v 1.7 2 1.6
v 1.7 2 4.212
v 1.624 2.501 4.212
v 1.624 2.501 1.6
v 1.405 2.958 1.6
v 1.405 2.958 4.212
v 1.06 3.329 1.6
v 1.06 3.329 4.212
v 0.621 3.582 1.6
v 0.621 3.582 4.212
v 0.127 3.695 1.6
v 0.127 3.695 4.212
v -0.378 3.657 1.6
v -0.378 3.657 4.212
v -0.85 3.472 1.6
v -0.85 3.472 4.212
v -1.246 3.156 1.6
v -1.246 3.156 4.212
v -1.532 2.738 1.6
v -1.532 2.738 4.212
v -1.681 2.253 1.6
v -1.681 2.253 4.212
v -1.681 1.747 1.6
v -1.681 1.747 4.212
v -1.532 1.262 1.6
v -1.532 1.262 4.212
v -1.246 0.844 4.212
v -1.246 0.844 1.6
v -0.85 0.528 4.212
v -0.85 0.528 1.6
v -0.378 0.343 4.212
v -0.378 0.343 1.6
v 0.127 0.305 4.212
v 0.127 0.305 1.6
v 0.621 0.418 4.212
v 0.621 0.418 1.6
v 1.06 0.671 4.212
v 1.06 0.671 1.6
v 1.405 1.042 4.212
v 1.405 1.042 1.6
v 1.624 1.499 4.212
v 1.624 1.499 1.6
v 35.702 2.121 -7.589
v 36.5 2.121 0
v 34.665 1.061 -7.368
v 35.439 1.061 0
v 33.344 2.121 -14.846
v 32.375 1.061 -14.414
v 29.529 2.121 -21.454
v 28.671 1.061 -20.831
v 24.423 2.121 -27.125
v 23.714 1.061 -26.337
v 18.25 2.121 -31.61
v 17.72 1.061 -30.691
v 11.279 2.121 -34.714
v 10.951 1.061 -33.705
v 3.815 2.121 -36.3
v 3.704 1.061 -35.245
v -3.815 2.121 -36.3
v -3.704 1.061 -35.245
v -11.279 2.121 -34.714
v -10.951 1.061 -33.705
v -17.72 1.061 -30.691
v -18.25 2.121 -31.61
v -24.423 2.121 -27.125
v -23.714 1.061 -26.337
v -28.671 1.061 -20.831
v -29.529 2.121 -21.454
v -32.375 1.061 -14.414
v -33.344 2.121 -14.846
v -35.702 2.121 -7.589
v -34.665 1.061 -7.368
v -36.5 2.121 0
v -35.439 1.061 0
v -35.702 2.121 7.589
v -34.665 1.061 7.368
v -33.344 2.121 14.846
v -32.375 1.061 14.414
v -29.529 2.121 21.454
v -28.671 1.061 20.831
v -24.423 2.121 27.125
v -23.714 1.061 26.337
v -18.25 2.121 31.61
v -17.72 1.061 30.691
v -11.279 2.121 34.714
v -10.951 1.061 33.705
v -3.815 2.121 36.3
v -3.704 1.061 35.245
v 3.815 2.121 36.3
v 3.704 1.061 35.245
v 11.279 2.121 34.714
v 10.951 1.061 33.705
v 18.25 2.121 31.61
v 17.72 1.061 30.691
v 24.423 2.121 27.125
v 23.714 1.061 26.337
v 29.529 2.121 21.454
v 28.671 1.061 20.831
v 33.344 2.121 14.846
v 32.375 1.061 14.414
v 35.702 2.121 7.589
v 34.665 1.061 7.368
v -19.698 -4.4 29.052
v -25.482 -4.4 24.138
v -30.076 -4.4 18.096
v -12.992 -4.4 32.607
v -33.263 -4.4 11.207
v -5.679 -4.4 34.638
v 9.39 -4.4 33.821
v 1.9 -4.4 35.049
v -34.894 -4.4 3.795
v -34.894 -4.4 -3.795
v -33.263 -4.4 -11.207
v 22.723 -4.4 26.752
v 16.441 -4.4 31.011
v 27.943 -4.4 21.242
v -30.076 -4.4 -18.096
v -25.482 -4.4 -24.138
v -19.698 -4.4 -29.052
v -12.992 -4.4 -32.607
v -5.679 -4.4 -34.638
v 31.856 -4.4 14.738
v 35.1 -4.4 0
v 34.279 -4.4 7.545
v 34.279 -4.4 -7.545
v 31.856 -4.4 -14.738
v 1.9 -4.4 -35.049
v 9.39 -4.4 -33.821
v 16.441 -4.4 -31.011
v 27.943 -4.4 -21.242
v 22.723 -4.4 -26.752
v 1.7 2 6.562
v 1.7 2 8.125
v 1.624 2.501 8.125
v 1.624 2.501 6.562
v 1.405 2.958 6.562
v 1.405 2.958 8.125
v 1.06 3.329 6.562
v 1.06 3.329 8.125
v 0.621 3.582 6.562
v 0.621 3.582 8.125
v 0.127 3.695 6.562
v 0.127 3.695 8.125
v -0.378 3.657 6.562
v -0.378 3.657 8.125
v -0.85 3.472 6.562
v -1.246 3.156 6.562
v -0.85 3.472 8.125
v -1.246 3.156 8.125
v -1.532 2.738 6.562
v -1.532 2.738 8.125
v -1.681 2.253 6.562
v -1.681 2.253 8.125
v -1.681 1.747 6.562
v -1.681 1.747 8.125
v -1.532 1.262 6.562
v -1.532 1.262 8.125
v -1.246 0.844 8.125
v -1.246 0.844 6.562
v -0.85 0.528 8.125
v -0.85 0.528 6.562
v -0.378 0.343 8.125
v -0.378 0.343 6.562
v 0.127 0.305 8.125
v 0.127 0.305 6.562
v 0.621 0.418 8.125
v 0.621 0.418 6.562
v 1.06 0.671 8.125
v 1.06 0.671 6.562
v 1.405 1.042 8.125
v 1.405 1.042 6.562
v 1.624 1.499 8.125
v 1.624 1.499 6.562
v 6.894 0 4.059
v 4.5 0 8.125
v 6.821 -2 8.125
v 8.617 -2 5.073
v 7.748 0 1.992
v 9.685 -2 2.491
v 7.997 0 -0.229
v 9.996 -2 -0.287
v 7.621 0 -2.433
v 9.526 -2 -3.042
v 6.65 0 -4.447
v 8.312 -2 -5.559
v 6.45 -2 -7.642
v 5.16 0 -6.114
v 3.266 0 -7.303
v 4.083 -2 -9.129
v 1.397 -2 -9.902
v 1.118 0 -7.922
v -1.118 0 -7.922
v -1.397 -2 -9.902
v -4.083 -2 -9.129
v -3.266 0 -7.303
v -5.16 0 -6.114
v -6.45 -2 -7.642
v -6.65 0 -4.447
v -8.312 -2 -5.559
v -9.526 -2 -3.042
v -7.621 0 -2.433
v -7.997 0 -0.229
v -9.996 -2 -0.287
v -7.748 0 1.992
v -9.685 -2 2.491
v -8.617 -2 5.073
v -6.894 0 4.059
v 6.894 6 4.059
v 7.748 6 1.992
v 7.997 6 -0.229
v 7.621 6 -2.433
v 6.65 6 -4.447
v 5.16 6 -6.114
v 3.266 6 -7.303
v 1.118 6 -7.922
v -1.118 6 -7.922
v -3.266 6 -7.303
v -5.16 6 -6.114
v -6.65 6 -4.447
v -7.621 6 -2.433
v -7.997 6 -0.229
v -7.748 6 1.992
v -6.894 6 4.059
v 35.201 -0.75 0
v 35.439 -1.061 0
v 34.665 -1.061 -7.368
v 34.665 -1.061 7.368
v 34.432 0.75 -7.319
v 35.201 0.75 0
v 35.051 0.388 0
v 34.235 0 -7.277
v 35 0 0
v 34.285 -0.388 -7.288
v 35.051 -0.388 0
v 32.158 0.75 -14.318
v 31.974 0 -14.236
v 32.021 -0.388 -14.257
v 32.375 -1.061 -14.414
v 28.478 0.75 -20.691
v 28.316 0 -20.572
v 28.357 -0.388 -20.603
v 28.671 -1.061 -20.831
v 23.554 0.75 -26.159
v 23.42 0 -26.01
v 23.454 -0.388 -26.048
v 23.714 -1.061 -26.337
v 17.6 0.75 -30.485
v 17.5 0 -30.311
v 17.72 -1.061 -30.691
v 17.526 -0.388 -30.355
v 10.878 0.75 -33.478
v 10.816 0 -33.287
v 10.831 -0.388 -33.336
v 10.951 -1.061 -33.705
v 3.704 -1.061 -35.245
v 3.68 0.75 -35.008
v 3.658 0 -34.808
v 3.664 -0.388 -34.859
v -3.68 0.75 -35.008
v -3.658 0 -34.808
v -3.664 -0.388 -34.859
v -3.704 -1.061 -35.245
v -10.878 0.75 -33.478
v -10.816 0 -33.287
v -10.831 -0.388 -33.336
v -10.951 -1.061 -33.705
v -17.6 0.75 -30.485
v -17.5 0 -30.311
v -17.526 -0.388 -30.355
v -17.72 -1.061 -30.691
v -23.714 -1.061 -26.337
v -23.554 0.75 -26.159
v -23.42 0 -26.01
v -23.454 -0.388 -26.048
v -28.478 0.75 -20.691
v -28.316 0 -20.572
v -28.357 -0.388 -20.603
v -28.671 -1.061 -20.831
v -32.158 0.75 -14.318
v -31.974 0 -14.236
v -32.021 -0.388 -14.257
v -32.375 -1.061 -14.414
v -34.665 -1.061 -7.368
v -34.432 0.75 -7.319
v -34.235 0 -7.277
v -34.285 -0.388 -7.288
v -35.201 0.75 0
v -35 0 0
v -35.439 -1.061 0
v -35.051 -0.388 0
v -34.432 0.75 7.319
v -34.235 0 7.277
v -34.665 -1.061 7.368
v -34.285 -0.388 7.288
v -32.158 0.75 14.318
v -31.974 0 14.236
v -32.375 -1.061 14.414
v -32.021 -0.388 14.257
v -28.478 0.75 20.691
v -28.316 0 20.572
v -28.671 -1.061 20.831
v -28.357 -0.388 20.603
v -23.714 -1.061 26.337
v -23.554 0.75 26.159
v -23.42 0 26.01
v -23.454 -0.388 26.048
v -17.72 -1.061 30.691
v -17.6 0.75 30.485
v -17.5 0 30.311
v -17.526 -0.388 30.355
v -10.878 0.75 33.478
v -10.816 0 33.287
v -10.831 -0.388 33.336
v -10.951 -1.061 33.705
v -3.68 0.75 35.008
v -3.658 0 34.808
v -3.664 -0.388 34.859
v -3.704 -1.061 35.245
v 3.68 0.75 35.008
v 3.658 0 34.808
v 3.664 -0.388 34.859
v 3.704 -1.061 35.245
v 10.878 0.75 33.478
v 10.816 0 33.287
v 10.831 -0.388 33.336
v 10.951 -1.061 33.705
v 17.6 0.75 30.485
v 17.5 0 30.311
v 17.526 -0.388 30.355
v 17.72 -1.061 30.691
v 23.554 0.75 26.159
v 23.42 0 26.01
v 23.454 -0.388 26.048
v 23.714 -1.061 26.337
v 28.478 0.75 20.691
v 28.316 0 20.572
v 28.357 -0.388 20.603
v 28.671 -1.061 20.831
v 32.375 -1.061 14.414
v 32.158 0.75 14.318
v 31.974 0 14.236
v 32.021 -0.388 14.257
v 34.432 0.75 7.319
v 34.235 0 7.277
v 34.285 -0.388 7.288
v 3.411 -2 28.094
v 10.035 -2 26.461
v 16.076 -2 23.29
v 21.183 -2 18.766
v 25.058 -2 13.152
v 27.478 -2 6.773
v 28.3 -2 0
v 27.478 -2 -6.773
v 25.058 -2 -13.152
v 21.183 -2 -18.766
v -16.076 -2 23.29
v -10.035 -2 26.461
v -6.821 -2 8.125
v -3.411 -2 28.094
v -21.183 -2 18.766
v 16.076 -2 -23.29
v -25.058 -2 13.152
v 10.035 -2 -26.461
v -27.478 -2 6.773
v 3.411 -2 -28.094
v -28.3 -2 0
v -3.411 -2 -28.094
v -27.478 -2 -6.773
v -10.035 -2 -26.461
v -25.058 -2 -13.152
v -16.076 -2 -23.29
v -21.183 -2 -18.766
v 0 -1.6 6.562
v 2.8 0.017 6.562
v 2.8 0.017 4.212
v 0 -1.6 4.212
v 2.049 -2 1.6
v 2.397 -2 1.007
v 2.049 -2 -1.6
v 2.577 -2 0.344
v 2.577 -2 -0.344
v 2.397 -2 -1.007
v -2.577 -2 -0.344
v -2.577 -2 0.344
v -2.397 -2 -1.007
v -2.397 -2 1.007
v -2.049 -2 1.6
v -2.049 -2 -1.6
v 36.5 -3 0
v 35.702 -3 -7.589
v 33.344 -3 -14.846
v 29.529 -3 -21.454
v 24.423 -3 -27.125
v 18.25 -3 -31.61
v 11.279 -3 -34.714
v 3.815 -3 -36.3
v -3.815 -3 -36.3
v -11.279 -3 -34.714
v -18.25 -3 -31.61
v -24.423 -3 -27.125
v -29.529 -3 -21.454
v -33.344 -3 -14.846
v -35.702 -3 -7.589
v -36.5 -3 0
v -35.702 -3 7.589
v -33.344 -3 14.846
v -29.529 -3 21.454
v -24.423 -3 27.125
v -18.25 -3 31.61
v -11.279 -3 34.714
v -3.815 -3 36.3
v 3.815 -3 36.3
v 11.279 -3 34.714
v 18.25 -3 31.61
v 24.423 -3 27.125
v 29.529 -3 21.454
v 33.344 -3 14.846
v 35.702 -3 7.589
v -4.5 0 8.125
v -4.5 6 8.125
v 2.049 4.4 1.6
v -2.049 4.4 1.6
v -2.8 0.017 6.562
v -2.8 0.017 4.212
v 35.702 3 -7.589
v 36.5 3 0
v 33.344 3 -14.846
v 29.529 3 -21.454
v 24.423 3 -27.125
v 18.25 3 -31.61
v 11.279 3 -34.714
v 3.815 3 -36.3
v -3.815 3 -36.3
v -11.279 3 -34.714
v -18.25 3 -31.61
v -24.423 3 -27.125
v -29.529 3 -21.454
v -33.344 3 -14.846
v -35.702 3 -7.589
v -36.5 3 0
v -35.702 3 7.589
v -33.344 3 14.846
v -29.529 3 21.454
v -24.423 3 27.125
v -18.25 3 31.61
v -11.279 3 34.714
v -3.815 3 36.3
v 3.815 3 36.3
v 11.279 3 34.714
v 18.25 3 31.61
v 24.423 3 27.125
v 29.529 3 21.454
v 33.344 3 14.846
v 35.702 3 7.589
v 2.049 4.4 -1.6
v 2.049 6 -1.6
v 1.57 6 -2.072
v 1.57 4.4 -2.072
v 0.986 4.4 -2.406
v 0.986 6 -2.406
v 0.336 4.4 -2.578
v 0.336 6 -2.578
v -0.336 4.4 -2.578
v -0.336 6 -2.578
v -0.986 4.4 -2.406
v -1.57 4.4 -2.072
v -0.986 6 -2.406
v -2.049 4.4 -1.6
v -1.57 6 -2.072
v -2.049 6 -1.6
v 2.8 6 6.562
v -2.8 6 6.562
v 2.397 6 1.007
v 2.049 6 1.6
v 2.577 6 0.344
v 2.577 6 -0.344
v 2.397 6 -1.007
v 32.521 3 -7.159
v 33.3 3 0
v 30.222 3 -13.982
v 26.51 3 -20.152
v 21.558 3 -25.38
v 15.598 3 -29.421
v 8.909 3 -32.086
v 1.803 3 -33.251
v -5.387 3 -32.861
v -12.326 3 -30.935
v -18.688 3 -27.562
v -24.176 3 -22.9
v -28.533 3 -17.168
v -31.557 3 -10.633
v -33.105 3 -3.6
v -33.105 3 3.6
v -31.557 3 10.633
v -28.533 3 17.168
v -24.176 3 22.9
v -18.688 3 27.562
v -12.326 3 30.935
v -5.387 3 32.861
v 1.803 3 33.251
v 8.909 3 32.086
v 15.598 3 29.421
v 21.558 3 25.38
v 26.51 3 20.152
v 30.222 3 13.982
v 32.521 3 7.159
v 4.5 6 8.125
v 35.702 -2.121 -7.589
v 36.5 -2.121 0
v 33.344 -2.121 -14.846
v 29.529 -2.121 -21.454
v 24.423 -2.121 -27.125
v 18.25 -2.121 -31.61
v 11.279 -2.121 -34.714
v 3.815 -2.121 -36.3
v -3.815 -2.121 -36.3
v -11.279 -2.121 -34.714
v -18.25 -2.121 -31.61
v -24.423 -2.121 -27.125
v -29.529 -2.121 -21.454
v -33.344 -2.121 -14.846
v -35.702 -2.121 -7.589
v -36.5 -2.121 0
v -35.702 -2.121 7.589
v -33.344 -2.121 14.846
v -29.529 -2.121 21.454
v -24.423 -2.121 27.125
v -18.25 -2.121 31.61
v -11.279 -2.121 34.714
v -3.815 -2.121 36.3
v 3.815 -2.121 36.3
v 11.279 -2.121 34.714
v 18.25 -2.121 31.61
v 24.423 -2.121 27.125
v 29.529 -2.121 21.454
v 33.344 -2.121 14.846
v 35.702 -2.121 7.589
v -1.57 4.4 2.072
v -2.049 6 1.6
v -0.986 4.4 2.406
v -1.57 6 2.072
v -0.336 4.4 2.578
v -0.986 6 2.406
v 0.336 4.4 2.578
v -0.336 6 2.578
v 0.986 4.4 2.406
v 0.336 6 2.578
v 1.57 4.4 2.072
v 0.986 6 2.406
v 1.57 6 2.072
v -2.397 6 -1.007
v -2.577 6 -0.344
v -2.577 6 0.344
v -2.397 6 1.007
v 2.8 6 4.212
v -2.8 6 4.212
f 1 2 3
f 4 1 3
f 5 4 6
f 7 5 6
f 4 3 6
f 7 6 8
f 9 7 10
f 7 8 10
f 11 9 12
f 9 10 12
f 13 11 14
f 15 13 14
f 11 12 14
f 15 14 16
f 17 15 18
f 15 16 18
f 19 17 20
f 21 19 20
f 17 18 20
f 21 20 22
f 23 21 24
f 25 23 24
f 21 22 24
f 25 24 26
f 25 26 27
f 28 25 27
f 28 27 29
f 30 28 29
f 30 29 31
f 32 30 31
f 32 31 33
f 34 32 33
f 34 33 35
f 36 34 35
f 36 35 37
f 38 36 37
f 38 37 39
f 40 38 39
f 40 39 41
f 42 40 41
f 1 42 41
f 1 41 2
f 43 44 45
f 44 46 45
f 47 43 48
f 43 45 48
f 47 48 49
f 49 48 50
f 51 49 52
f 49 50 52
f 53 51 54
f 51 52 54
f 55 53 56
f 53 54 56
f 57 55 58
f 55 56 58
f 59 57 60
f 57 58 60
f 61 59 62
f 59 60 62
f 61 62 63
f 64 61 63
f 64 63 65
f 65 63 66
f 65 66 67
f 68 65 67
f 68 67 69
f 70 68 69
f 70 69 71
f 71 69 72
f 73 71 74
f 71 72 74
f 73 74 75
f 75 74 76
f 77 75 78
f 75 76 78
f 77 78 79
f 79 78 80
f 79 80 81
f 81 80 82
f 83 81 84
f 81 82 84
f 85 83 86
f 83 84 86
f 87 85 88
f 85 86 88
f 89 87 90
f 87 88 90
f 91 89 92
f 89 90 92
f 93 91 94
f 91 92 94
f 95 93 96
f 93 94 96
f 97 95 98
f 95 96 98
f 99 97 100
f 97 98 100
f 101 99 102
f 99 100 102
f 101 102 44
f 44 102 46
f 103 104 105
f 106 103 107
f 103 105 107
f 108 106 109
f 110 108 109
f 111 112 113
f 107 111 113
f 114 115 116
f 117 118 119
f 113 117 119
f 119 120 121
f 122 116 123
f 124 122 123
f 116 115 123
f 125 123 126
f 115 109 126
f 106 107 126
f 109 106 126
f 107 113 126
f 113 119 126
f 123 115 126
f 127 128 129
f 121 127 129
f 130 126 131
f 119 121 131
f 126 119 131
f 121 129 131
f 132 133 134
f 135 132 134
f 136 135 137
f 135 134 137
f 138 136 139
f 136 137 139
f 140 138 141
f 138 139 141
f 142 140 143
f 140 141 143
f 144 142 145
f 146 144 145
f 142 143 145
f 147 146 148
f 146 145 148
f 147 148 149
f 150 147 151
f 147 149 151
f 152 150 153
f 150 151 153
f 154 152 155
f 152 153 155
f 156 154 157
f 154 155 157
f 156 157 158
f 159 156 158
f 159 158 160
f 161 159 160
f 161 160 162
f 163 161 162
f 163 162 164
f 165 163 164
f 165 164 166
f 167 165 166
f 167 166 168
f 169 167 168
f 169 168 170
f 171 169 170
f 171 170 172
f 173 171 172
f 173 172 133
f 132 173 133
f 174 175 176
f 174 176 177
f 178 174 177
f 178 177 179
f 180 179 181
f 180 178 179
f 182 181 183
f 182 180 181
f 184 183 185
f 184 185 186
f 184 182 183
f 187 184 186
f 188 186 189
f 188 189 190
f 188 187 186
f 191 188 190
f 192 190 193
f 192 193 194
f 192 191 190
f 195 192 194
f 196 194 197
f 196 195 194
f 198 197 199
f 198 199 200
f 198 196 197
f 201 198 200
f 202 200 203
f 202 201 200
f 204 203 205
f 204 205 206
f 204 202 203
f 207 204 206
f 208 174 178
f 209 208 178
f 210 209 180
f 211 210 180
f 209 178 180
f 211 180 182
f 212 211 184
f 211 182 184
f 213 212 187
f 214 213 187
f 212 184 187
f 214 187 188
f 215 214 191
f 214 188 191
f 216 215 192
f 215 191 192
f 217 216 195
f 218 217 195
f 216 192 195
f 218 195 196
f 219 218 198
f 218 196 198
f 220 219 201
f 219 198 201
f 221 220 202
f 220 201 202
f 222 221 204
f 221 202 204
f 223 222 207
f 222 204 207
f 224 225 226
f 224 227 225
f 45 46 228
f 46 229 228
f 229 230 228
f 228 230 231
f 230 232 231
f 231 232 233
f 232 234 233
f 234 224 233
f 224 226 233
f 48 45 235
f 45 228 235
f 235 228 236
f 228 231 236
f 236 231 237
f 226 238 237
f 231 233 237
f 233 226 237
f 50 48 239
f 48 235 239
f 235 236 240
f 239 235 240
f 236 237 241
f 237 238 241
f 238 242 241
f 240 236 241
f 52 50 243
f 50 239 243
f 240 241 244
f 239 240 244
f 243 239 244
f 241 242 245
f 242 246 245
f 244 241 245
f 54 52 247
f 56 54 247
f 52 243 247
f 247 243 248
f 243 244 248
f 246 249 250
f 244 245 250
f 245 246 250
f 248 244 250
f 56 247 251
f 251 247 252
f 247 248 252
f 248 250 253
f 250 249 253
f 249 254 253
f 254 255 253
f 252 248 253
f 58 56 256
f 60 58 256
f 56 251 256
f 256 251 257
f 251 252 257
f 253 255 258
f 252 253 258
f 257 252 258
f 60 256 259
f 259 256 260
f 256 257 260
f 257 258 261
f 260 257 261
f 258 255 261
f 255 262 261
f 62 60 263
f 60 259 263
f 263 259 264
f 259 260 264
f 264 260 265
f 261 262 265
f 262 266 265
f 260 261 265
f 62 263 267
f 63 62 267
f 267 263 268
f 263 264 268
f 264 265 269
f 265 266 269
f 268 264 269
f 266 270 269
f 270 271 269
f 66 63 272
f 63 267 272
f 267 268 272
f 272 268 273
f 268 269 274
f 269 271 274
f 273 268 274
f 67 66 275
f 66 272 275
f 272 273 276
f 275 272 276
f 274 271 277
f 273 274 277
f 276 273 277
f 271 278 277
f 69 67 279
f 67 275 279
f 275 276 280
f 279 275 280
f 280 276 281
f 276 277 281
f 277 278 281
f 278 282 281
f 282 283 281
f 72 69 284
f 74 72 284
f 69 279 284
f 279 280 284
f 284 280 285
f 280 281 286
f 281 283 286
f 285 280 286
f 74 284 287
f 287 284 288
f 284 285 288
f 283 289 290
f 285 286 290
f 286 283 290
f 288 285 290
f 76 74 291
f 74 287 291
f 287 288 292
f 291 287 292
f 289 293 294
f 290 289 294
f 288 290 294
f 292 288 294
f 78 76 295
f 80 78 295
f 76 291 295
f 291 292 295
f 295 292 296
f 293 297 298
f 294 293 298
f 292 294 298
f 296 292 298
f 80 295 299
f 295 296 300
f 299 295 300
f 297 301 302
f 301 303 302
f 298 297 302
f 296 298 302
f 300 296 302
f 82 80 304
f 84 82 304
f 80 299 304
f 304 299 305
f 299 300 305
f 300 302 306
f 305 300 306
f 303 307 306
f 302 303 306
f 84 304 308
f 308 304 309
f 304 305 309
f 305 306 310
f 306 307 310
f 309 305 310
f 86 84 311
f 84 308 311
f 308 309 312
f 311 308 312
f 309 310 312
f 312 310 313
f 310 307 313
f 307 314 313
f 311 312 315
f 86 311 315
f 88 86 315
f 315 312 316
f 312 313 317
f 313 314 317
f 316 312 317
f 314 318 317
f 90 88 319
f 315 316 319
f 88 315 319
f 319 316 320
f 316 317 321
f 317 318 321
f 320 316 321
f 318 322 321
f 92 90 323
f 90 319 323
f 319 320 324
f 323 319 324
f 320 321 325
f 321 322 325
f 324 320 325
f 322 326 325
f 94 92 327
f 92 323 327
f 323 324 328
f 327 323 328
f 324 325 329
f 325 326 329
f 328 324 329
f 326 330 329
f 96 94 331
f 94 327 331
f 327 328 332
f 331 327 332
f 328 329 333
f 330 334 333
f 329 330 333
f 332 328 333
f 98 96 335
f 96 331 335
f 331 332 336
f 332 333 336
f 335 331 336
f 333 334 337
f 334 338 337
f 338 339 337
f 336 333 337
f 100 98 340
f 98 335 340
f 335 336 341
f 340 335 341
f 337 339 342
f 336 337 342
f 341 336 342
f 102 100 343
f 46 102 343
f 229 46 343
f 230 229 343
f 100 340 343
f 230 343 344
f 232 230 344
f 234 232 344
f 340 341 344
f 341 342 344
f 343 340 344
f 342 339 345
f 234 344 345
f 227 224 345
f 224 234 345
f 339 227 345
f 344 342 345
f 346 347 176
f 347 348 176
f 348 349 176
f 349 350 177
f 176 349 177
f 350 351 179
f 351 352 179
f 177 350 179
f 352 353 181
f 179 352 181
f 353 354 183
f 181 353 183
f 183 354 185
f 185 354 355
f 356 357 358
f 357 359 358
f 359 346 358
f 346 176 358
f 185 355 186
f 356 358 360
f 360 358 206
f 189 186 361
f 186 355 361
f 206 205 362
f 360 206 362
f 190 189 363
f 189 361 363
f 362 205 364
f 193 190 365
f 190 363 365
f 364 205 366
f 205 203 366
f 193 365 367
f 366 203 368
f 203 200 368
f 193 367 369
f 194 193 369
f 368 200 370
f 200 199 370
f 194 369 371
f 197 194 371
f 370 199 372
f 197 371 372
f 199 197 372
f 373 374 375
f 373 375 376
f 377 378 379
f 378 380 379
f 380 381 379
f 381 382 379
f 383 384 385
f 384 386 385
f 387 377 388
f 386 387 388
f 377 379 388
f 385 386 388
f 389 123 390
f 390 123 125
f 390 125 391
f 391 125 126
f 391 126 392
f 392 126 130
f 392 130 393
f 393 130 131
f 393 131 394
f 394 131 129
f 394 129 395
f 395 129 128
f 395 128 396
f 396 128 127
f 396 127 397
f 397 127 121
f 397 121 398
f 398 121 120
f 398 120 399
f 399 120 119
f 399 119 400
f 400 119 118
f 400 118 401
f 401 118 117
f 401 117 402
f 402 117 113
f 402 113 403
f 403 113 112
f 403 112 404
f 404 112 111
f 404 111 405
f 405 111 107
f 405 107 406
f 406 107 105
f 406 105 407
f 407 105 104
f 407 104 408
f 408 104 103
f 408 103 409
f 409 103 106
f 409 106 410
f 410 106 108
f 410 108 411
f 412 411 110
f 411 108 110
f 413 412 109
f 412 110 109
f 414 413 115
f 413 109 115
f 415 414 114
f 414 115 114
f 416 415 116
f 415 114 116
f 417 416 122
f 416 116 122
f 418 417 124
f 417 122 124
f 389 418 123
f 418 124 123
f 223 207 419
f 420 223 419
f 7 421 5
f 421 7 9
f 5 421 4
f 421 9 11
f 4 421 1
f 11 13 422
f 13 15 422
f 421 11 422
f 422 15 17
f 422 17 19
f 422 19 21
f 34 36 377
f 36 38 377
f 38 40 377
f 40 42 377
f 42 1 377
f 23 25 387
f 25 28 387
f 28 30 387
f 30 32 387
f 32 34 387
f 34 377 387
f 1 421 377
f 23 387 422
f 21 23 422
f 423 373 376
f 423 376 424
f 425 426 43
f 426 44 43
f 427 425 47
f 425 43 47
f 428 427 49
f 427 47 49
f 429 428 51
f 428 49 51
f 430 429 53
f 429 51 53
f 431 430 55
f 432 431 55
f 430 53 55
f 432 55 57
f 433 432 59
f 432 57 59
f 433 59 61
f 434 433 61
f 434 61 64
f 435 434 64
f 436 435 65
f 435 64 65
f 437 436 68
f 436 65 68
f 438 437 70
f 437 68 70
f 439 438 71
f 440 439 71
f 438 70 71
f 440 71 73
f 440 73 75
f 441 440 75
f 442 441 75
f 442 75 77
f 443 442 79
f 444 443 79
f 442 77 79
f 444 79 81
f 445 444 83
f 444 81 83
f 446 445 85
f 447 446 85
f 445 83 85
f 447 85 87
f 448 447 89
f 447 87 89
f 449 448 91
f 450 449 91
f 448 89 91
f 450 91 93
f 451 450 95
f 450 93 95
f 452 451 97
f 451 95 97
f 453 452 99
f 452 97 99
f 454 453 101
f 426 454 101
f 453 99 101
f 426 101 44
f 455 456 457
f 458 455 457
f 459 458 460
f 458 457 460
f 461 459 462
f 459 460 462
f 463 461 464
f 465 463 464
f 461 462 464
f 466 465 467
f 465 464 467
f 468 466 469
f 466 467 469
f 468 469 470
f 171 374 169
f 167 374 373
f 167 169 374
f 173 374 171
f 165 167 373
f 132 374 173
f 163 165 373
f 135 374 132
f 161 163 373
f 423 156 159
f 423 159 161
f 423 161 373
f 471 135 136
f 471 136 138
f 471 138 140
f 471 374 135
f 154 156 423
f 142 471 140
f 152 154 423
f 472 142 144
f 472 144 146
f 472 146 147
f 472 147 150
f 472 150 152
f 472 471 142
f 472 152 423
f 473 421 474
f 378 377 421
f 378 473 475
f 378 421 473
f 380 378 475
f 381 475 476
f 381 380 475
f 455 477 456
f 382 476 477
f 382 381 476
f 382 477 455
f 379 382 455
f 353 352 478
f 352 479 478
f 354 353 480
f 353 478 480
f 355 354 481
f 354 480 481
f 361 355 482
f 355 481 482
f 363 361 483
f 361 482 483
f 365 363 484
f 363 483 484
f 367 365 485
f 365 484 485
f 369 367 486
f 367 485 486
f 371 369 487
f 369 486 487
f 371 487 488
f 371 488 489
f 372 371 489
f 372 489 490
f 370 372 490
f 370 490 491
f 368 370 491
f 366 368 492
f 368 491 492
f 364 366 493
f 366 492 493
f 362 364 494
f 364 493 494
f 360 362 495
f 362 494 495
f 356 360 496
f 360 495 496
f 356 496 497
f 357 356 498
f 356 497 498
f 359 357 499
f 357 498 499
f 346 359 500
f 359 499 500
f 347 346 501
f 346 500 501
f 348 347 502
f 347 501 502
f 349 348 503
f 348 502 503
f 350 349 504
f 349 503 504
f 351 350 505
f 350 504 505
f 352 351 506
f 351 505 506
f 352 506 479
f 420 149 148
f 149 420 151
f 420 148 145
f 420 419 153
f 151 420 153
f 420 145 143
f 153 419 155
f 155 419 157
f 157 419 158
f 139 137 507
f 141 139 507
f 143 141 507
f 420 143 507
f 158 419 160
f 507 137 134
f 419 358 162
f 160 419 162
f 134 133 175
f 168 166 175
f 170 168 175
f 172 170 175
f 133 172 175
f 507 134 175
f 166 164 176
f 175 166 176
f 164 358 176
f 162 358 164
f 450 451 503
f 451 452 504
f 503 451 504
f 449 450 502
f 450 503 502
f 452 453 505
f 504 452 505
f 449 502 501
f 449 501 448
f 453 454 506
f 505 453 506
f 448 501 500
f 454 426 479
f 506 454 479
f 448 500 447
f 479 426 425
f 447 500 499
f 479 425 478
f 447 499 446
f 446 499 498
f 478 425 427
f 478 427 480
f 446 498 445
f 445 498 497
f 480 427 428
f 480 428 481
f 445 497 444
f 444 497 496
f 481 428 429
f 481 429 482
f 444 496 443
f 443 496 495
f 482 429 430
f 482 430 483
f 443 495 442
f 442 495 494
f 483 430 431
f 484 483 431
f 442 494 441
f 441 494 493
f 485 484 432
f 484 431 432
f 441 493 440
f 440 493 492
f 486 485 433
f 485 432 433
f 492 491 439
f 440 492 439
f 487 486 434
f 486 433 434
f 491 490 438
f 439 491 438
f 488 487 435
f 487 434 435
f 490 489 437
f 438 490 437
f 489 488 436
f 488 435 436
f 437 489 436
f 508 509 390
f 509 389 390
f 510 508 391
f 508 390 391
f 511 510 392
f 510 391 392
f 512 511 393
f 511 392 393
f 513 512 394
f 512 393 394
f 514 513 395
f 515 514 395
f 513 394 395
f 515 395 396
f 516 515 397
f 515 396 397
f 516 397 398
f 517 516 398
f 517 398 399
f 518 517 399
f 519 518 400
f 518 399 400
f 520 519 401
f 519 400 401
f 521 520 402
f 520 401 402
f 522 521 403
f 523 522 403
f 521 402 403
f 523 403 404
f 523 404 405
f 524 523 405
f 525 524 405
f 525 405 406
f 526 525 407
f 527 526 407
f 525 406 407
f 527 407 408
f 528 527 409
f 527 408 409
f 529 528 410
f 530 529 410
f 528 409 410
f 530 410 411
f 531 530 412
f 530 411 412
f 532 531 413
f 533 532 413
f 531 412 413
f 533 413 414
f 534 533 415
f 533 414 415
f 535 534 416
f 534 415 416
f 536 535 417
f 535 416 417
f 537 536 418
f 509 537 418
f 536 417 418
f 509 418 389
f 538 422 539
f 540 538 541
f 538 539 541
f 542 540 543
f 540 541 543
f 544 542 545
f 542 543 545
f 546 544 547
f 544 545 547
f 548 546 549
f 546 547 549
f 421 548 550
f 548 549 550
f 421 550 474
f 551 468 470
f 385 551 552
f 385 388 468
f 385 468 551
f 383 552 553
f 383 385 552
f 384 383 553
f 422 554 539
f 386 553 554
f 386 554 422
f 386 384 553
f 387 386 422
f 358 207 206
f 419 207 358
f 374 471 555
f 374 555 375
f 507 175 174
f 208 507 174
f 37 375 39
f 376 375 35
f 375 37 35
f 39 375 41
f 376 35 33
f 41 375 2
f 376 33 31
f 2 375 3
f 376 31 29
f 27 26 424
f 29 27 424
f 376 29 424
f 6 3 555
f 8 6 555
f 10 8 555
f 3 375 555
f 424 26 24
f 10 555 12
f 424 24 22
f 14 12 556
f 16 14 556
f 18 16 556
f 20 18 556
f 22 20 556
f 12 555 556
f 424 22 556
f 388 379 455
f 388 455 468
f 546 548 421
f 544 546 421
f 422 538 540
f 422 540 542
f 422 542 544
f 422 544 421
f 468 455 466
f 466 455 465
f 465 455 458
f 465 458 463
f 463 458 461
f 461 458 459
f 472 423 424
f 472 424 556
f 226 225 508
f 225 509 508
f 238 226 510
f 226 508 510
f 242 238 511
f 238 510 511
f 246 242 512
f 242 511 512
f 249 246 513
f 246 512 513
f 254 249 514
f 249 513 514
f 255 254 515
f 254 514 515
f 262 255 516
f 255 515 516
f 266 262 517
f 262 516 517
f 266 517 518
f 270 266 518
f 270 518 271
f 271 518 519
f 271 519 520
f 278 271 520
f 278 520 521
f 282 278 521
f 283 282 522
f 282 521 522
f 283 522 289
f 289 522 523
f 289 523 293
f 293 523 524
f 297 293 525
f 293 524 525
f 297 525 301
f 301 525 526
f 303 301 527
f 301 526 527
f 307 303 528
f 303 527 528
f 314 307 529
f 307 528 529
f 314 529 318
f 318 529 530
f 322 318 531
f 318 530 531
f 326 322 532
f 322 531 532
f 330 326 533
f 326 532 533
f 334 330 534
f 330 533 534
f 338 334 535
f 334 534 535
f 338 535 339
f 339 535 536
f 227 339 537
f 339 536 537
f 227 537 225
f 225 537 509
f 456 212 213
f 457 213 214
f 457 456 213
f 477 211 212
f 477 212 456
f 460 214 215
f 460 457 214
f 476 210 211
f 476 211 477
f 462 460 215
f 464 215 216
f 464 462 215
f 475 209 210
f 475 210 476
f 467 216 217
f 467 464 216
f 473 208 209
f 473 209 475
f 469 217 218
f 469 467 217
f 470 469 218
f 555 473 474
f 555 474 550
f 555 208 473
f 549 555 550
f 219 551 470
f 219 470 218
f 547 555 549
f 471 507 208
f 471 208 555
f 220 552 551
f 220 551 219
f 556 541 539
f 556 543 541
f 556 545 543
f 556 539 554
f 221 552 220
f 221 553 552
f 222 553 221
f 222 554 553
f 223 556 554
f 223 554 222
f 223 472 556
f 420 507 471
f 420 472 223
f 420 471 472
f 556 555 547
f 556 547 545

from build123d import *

# Parameters (mm, degrees)
PAD_DEPTH       = 8
CHAMFER_SIZE    = 2
SKETCH002_R     = 2.6
POCKET_DEPTH    = 1.6
SKETCH003_R     = 1.7
POCKET001_DEPTH = 8
POCKET002_DEPTH = 1.175


with BuildPart() as part:
    # Sketch → Revolution (revolve)
    with BuildSketch(Plane.XY):
        with BuildLine():
            Line((0, -2), (28.3, -2))
            Line((28.3, -2), (33.3, 3))
            Line((33.3, 3), (36.5, 3))
            Line((36.5, 3), (36.5, 2.12132))
            Line((36.5, 2.12132), (35.43934, 1.06066))
            ThreePointArc((35.43934, 1.06066), (35, 0), (35.43934, -1.06066))
            Line((35.43934, -1.06066), (36.5, -2.12132))
            Line((36.5, -2.12132), (36.5, -3))
            Line((36.5, -3), (35.1, -4.4))
            Line((35.1, -4.4), (0, -4.4))
            Line((0, -4.4), (0, -2))
        make_face()
    revolve(axis=Axis((0, 0, 0), (0, 1, 0)))

    # Sketch001 (on Face1 of Revolution) → Pad (new body)
    with BuildSketch(Plane(origin=(0, -2, 0), x_dir=(-1, 0, 0), z_dir=(0, 1, 0))):
        with BuildLine():
            Line((4.5, 8.125), (-4.5, 8.125))
            Line((-4.5, 8.125), (-6.893963, 4.058728))
            ThreePointArc((-6.893963, 4.058728), (0, -8), (6.893963, 4.058728))
            Line((6.893963, 4.058728), (4.5, 8.125))
        make_face()
        with BuildLine():
            Line((-2.04939, 1.6), (2.04939, 1.6))
            ThreePointArc((2.04939, -1.6), (2.6, 0), (2.04939, 1.6))
            Line((-2.04939, -1.6), (2.04939, -1.6))
            ThreePointArc((-2.04939, 1.6), (-2.6, 0), (-2.04939, -1.6))
        make_face(mode=Mode.SUBTRACT)
    extrude(amount=PAD_DEPTH)

    # Chamfer
    chamfer_edges = [part.edges().sort_by_distance(p)[0] for p in [
        (0, -2, -8),
    ]]
    chamfer(chamfer_edges, length=CHAMFER_SIZE)

    # Sketch002 (on Face8 of Chamfer) → Pocket (cut)
    with BuildSketch(Plane(origin=(0, 6, 0), x_dir=(-1, 0, 0), z_dir=(0, 1, 0))):
        Circle(SKETCH002_R)
    extrude(amount=-POCKET_DEPTH, mode=Mode.SUBTRACT)

    # Sketch003 (on Face8 of Pocket) → Pocket001 (cut)
    with BuildSketch(Plane.XY.offset(8.125)):
        with Locations((0, 2)):
            Circle(SKETCH003_R)
    extrude(amount=-POCKET001_DEPTH, mode=Mode.SUBTRACT)

    # Sketch004 (on Face9 of Pocket001) → Pocket002 (cut, symmetric)
    with BuildSketch(Plane.XY.offset(5.3875)):
        Polygon((-2.8, 0.016581), (-2.8, 6.016581), (2.8, 6.016581), (2.8, 0.016581), (0, -1.6), align=None)
    extrude(amount=POCKET002_DEPTH, both=True, mode=Mode.SUBTRACT)


solid = part.part
